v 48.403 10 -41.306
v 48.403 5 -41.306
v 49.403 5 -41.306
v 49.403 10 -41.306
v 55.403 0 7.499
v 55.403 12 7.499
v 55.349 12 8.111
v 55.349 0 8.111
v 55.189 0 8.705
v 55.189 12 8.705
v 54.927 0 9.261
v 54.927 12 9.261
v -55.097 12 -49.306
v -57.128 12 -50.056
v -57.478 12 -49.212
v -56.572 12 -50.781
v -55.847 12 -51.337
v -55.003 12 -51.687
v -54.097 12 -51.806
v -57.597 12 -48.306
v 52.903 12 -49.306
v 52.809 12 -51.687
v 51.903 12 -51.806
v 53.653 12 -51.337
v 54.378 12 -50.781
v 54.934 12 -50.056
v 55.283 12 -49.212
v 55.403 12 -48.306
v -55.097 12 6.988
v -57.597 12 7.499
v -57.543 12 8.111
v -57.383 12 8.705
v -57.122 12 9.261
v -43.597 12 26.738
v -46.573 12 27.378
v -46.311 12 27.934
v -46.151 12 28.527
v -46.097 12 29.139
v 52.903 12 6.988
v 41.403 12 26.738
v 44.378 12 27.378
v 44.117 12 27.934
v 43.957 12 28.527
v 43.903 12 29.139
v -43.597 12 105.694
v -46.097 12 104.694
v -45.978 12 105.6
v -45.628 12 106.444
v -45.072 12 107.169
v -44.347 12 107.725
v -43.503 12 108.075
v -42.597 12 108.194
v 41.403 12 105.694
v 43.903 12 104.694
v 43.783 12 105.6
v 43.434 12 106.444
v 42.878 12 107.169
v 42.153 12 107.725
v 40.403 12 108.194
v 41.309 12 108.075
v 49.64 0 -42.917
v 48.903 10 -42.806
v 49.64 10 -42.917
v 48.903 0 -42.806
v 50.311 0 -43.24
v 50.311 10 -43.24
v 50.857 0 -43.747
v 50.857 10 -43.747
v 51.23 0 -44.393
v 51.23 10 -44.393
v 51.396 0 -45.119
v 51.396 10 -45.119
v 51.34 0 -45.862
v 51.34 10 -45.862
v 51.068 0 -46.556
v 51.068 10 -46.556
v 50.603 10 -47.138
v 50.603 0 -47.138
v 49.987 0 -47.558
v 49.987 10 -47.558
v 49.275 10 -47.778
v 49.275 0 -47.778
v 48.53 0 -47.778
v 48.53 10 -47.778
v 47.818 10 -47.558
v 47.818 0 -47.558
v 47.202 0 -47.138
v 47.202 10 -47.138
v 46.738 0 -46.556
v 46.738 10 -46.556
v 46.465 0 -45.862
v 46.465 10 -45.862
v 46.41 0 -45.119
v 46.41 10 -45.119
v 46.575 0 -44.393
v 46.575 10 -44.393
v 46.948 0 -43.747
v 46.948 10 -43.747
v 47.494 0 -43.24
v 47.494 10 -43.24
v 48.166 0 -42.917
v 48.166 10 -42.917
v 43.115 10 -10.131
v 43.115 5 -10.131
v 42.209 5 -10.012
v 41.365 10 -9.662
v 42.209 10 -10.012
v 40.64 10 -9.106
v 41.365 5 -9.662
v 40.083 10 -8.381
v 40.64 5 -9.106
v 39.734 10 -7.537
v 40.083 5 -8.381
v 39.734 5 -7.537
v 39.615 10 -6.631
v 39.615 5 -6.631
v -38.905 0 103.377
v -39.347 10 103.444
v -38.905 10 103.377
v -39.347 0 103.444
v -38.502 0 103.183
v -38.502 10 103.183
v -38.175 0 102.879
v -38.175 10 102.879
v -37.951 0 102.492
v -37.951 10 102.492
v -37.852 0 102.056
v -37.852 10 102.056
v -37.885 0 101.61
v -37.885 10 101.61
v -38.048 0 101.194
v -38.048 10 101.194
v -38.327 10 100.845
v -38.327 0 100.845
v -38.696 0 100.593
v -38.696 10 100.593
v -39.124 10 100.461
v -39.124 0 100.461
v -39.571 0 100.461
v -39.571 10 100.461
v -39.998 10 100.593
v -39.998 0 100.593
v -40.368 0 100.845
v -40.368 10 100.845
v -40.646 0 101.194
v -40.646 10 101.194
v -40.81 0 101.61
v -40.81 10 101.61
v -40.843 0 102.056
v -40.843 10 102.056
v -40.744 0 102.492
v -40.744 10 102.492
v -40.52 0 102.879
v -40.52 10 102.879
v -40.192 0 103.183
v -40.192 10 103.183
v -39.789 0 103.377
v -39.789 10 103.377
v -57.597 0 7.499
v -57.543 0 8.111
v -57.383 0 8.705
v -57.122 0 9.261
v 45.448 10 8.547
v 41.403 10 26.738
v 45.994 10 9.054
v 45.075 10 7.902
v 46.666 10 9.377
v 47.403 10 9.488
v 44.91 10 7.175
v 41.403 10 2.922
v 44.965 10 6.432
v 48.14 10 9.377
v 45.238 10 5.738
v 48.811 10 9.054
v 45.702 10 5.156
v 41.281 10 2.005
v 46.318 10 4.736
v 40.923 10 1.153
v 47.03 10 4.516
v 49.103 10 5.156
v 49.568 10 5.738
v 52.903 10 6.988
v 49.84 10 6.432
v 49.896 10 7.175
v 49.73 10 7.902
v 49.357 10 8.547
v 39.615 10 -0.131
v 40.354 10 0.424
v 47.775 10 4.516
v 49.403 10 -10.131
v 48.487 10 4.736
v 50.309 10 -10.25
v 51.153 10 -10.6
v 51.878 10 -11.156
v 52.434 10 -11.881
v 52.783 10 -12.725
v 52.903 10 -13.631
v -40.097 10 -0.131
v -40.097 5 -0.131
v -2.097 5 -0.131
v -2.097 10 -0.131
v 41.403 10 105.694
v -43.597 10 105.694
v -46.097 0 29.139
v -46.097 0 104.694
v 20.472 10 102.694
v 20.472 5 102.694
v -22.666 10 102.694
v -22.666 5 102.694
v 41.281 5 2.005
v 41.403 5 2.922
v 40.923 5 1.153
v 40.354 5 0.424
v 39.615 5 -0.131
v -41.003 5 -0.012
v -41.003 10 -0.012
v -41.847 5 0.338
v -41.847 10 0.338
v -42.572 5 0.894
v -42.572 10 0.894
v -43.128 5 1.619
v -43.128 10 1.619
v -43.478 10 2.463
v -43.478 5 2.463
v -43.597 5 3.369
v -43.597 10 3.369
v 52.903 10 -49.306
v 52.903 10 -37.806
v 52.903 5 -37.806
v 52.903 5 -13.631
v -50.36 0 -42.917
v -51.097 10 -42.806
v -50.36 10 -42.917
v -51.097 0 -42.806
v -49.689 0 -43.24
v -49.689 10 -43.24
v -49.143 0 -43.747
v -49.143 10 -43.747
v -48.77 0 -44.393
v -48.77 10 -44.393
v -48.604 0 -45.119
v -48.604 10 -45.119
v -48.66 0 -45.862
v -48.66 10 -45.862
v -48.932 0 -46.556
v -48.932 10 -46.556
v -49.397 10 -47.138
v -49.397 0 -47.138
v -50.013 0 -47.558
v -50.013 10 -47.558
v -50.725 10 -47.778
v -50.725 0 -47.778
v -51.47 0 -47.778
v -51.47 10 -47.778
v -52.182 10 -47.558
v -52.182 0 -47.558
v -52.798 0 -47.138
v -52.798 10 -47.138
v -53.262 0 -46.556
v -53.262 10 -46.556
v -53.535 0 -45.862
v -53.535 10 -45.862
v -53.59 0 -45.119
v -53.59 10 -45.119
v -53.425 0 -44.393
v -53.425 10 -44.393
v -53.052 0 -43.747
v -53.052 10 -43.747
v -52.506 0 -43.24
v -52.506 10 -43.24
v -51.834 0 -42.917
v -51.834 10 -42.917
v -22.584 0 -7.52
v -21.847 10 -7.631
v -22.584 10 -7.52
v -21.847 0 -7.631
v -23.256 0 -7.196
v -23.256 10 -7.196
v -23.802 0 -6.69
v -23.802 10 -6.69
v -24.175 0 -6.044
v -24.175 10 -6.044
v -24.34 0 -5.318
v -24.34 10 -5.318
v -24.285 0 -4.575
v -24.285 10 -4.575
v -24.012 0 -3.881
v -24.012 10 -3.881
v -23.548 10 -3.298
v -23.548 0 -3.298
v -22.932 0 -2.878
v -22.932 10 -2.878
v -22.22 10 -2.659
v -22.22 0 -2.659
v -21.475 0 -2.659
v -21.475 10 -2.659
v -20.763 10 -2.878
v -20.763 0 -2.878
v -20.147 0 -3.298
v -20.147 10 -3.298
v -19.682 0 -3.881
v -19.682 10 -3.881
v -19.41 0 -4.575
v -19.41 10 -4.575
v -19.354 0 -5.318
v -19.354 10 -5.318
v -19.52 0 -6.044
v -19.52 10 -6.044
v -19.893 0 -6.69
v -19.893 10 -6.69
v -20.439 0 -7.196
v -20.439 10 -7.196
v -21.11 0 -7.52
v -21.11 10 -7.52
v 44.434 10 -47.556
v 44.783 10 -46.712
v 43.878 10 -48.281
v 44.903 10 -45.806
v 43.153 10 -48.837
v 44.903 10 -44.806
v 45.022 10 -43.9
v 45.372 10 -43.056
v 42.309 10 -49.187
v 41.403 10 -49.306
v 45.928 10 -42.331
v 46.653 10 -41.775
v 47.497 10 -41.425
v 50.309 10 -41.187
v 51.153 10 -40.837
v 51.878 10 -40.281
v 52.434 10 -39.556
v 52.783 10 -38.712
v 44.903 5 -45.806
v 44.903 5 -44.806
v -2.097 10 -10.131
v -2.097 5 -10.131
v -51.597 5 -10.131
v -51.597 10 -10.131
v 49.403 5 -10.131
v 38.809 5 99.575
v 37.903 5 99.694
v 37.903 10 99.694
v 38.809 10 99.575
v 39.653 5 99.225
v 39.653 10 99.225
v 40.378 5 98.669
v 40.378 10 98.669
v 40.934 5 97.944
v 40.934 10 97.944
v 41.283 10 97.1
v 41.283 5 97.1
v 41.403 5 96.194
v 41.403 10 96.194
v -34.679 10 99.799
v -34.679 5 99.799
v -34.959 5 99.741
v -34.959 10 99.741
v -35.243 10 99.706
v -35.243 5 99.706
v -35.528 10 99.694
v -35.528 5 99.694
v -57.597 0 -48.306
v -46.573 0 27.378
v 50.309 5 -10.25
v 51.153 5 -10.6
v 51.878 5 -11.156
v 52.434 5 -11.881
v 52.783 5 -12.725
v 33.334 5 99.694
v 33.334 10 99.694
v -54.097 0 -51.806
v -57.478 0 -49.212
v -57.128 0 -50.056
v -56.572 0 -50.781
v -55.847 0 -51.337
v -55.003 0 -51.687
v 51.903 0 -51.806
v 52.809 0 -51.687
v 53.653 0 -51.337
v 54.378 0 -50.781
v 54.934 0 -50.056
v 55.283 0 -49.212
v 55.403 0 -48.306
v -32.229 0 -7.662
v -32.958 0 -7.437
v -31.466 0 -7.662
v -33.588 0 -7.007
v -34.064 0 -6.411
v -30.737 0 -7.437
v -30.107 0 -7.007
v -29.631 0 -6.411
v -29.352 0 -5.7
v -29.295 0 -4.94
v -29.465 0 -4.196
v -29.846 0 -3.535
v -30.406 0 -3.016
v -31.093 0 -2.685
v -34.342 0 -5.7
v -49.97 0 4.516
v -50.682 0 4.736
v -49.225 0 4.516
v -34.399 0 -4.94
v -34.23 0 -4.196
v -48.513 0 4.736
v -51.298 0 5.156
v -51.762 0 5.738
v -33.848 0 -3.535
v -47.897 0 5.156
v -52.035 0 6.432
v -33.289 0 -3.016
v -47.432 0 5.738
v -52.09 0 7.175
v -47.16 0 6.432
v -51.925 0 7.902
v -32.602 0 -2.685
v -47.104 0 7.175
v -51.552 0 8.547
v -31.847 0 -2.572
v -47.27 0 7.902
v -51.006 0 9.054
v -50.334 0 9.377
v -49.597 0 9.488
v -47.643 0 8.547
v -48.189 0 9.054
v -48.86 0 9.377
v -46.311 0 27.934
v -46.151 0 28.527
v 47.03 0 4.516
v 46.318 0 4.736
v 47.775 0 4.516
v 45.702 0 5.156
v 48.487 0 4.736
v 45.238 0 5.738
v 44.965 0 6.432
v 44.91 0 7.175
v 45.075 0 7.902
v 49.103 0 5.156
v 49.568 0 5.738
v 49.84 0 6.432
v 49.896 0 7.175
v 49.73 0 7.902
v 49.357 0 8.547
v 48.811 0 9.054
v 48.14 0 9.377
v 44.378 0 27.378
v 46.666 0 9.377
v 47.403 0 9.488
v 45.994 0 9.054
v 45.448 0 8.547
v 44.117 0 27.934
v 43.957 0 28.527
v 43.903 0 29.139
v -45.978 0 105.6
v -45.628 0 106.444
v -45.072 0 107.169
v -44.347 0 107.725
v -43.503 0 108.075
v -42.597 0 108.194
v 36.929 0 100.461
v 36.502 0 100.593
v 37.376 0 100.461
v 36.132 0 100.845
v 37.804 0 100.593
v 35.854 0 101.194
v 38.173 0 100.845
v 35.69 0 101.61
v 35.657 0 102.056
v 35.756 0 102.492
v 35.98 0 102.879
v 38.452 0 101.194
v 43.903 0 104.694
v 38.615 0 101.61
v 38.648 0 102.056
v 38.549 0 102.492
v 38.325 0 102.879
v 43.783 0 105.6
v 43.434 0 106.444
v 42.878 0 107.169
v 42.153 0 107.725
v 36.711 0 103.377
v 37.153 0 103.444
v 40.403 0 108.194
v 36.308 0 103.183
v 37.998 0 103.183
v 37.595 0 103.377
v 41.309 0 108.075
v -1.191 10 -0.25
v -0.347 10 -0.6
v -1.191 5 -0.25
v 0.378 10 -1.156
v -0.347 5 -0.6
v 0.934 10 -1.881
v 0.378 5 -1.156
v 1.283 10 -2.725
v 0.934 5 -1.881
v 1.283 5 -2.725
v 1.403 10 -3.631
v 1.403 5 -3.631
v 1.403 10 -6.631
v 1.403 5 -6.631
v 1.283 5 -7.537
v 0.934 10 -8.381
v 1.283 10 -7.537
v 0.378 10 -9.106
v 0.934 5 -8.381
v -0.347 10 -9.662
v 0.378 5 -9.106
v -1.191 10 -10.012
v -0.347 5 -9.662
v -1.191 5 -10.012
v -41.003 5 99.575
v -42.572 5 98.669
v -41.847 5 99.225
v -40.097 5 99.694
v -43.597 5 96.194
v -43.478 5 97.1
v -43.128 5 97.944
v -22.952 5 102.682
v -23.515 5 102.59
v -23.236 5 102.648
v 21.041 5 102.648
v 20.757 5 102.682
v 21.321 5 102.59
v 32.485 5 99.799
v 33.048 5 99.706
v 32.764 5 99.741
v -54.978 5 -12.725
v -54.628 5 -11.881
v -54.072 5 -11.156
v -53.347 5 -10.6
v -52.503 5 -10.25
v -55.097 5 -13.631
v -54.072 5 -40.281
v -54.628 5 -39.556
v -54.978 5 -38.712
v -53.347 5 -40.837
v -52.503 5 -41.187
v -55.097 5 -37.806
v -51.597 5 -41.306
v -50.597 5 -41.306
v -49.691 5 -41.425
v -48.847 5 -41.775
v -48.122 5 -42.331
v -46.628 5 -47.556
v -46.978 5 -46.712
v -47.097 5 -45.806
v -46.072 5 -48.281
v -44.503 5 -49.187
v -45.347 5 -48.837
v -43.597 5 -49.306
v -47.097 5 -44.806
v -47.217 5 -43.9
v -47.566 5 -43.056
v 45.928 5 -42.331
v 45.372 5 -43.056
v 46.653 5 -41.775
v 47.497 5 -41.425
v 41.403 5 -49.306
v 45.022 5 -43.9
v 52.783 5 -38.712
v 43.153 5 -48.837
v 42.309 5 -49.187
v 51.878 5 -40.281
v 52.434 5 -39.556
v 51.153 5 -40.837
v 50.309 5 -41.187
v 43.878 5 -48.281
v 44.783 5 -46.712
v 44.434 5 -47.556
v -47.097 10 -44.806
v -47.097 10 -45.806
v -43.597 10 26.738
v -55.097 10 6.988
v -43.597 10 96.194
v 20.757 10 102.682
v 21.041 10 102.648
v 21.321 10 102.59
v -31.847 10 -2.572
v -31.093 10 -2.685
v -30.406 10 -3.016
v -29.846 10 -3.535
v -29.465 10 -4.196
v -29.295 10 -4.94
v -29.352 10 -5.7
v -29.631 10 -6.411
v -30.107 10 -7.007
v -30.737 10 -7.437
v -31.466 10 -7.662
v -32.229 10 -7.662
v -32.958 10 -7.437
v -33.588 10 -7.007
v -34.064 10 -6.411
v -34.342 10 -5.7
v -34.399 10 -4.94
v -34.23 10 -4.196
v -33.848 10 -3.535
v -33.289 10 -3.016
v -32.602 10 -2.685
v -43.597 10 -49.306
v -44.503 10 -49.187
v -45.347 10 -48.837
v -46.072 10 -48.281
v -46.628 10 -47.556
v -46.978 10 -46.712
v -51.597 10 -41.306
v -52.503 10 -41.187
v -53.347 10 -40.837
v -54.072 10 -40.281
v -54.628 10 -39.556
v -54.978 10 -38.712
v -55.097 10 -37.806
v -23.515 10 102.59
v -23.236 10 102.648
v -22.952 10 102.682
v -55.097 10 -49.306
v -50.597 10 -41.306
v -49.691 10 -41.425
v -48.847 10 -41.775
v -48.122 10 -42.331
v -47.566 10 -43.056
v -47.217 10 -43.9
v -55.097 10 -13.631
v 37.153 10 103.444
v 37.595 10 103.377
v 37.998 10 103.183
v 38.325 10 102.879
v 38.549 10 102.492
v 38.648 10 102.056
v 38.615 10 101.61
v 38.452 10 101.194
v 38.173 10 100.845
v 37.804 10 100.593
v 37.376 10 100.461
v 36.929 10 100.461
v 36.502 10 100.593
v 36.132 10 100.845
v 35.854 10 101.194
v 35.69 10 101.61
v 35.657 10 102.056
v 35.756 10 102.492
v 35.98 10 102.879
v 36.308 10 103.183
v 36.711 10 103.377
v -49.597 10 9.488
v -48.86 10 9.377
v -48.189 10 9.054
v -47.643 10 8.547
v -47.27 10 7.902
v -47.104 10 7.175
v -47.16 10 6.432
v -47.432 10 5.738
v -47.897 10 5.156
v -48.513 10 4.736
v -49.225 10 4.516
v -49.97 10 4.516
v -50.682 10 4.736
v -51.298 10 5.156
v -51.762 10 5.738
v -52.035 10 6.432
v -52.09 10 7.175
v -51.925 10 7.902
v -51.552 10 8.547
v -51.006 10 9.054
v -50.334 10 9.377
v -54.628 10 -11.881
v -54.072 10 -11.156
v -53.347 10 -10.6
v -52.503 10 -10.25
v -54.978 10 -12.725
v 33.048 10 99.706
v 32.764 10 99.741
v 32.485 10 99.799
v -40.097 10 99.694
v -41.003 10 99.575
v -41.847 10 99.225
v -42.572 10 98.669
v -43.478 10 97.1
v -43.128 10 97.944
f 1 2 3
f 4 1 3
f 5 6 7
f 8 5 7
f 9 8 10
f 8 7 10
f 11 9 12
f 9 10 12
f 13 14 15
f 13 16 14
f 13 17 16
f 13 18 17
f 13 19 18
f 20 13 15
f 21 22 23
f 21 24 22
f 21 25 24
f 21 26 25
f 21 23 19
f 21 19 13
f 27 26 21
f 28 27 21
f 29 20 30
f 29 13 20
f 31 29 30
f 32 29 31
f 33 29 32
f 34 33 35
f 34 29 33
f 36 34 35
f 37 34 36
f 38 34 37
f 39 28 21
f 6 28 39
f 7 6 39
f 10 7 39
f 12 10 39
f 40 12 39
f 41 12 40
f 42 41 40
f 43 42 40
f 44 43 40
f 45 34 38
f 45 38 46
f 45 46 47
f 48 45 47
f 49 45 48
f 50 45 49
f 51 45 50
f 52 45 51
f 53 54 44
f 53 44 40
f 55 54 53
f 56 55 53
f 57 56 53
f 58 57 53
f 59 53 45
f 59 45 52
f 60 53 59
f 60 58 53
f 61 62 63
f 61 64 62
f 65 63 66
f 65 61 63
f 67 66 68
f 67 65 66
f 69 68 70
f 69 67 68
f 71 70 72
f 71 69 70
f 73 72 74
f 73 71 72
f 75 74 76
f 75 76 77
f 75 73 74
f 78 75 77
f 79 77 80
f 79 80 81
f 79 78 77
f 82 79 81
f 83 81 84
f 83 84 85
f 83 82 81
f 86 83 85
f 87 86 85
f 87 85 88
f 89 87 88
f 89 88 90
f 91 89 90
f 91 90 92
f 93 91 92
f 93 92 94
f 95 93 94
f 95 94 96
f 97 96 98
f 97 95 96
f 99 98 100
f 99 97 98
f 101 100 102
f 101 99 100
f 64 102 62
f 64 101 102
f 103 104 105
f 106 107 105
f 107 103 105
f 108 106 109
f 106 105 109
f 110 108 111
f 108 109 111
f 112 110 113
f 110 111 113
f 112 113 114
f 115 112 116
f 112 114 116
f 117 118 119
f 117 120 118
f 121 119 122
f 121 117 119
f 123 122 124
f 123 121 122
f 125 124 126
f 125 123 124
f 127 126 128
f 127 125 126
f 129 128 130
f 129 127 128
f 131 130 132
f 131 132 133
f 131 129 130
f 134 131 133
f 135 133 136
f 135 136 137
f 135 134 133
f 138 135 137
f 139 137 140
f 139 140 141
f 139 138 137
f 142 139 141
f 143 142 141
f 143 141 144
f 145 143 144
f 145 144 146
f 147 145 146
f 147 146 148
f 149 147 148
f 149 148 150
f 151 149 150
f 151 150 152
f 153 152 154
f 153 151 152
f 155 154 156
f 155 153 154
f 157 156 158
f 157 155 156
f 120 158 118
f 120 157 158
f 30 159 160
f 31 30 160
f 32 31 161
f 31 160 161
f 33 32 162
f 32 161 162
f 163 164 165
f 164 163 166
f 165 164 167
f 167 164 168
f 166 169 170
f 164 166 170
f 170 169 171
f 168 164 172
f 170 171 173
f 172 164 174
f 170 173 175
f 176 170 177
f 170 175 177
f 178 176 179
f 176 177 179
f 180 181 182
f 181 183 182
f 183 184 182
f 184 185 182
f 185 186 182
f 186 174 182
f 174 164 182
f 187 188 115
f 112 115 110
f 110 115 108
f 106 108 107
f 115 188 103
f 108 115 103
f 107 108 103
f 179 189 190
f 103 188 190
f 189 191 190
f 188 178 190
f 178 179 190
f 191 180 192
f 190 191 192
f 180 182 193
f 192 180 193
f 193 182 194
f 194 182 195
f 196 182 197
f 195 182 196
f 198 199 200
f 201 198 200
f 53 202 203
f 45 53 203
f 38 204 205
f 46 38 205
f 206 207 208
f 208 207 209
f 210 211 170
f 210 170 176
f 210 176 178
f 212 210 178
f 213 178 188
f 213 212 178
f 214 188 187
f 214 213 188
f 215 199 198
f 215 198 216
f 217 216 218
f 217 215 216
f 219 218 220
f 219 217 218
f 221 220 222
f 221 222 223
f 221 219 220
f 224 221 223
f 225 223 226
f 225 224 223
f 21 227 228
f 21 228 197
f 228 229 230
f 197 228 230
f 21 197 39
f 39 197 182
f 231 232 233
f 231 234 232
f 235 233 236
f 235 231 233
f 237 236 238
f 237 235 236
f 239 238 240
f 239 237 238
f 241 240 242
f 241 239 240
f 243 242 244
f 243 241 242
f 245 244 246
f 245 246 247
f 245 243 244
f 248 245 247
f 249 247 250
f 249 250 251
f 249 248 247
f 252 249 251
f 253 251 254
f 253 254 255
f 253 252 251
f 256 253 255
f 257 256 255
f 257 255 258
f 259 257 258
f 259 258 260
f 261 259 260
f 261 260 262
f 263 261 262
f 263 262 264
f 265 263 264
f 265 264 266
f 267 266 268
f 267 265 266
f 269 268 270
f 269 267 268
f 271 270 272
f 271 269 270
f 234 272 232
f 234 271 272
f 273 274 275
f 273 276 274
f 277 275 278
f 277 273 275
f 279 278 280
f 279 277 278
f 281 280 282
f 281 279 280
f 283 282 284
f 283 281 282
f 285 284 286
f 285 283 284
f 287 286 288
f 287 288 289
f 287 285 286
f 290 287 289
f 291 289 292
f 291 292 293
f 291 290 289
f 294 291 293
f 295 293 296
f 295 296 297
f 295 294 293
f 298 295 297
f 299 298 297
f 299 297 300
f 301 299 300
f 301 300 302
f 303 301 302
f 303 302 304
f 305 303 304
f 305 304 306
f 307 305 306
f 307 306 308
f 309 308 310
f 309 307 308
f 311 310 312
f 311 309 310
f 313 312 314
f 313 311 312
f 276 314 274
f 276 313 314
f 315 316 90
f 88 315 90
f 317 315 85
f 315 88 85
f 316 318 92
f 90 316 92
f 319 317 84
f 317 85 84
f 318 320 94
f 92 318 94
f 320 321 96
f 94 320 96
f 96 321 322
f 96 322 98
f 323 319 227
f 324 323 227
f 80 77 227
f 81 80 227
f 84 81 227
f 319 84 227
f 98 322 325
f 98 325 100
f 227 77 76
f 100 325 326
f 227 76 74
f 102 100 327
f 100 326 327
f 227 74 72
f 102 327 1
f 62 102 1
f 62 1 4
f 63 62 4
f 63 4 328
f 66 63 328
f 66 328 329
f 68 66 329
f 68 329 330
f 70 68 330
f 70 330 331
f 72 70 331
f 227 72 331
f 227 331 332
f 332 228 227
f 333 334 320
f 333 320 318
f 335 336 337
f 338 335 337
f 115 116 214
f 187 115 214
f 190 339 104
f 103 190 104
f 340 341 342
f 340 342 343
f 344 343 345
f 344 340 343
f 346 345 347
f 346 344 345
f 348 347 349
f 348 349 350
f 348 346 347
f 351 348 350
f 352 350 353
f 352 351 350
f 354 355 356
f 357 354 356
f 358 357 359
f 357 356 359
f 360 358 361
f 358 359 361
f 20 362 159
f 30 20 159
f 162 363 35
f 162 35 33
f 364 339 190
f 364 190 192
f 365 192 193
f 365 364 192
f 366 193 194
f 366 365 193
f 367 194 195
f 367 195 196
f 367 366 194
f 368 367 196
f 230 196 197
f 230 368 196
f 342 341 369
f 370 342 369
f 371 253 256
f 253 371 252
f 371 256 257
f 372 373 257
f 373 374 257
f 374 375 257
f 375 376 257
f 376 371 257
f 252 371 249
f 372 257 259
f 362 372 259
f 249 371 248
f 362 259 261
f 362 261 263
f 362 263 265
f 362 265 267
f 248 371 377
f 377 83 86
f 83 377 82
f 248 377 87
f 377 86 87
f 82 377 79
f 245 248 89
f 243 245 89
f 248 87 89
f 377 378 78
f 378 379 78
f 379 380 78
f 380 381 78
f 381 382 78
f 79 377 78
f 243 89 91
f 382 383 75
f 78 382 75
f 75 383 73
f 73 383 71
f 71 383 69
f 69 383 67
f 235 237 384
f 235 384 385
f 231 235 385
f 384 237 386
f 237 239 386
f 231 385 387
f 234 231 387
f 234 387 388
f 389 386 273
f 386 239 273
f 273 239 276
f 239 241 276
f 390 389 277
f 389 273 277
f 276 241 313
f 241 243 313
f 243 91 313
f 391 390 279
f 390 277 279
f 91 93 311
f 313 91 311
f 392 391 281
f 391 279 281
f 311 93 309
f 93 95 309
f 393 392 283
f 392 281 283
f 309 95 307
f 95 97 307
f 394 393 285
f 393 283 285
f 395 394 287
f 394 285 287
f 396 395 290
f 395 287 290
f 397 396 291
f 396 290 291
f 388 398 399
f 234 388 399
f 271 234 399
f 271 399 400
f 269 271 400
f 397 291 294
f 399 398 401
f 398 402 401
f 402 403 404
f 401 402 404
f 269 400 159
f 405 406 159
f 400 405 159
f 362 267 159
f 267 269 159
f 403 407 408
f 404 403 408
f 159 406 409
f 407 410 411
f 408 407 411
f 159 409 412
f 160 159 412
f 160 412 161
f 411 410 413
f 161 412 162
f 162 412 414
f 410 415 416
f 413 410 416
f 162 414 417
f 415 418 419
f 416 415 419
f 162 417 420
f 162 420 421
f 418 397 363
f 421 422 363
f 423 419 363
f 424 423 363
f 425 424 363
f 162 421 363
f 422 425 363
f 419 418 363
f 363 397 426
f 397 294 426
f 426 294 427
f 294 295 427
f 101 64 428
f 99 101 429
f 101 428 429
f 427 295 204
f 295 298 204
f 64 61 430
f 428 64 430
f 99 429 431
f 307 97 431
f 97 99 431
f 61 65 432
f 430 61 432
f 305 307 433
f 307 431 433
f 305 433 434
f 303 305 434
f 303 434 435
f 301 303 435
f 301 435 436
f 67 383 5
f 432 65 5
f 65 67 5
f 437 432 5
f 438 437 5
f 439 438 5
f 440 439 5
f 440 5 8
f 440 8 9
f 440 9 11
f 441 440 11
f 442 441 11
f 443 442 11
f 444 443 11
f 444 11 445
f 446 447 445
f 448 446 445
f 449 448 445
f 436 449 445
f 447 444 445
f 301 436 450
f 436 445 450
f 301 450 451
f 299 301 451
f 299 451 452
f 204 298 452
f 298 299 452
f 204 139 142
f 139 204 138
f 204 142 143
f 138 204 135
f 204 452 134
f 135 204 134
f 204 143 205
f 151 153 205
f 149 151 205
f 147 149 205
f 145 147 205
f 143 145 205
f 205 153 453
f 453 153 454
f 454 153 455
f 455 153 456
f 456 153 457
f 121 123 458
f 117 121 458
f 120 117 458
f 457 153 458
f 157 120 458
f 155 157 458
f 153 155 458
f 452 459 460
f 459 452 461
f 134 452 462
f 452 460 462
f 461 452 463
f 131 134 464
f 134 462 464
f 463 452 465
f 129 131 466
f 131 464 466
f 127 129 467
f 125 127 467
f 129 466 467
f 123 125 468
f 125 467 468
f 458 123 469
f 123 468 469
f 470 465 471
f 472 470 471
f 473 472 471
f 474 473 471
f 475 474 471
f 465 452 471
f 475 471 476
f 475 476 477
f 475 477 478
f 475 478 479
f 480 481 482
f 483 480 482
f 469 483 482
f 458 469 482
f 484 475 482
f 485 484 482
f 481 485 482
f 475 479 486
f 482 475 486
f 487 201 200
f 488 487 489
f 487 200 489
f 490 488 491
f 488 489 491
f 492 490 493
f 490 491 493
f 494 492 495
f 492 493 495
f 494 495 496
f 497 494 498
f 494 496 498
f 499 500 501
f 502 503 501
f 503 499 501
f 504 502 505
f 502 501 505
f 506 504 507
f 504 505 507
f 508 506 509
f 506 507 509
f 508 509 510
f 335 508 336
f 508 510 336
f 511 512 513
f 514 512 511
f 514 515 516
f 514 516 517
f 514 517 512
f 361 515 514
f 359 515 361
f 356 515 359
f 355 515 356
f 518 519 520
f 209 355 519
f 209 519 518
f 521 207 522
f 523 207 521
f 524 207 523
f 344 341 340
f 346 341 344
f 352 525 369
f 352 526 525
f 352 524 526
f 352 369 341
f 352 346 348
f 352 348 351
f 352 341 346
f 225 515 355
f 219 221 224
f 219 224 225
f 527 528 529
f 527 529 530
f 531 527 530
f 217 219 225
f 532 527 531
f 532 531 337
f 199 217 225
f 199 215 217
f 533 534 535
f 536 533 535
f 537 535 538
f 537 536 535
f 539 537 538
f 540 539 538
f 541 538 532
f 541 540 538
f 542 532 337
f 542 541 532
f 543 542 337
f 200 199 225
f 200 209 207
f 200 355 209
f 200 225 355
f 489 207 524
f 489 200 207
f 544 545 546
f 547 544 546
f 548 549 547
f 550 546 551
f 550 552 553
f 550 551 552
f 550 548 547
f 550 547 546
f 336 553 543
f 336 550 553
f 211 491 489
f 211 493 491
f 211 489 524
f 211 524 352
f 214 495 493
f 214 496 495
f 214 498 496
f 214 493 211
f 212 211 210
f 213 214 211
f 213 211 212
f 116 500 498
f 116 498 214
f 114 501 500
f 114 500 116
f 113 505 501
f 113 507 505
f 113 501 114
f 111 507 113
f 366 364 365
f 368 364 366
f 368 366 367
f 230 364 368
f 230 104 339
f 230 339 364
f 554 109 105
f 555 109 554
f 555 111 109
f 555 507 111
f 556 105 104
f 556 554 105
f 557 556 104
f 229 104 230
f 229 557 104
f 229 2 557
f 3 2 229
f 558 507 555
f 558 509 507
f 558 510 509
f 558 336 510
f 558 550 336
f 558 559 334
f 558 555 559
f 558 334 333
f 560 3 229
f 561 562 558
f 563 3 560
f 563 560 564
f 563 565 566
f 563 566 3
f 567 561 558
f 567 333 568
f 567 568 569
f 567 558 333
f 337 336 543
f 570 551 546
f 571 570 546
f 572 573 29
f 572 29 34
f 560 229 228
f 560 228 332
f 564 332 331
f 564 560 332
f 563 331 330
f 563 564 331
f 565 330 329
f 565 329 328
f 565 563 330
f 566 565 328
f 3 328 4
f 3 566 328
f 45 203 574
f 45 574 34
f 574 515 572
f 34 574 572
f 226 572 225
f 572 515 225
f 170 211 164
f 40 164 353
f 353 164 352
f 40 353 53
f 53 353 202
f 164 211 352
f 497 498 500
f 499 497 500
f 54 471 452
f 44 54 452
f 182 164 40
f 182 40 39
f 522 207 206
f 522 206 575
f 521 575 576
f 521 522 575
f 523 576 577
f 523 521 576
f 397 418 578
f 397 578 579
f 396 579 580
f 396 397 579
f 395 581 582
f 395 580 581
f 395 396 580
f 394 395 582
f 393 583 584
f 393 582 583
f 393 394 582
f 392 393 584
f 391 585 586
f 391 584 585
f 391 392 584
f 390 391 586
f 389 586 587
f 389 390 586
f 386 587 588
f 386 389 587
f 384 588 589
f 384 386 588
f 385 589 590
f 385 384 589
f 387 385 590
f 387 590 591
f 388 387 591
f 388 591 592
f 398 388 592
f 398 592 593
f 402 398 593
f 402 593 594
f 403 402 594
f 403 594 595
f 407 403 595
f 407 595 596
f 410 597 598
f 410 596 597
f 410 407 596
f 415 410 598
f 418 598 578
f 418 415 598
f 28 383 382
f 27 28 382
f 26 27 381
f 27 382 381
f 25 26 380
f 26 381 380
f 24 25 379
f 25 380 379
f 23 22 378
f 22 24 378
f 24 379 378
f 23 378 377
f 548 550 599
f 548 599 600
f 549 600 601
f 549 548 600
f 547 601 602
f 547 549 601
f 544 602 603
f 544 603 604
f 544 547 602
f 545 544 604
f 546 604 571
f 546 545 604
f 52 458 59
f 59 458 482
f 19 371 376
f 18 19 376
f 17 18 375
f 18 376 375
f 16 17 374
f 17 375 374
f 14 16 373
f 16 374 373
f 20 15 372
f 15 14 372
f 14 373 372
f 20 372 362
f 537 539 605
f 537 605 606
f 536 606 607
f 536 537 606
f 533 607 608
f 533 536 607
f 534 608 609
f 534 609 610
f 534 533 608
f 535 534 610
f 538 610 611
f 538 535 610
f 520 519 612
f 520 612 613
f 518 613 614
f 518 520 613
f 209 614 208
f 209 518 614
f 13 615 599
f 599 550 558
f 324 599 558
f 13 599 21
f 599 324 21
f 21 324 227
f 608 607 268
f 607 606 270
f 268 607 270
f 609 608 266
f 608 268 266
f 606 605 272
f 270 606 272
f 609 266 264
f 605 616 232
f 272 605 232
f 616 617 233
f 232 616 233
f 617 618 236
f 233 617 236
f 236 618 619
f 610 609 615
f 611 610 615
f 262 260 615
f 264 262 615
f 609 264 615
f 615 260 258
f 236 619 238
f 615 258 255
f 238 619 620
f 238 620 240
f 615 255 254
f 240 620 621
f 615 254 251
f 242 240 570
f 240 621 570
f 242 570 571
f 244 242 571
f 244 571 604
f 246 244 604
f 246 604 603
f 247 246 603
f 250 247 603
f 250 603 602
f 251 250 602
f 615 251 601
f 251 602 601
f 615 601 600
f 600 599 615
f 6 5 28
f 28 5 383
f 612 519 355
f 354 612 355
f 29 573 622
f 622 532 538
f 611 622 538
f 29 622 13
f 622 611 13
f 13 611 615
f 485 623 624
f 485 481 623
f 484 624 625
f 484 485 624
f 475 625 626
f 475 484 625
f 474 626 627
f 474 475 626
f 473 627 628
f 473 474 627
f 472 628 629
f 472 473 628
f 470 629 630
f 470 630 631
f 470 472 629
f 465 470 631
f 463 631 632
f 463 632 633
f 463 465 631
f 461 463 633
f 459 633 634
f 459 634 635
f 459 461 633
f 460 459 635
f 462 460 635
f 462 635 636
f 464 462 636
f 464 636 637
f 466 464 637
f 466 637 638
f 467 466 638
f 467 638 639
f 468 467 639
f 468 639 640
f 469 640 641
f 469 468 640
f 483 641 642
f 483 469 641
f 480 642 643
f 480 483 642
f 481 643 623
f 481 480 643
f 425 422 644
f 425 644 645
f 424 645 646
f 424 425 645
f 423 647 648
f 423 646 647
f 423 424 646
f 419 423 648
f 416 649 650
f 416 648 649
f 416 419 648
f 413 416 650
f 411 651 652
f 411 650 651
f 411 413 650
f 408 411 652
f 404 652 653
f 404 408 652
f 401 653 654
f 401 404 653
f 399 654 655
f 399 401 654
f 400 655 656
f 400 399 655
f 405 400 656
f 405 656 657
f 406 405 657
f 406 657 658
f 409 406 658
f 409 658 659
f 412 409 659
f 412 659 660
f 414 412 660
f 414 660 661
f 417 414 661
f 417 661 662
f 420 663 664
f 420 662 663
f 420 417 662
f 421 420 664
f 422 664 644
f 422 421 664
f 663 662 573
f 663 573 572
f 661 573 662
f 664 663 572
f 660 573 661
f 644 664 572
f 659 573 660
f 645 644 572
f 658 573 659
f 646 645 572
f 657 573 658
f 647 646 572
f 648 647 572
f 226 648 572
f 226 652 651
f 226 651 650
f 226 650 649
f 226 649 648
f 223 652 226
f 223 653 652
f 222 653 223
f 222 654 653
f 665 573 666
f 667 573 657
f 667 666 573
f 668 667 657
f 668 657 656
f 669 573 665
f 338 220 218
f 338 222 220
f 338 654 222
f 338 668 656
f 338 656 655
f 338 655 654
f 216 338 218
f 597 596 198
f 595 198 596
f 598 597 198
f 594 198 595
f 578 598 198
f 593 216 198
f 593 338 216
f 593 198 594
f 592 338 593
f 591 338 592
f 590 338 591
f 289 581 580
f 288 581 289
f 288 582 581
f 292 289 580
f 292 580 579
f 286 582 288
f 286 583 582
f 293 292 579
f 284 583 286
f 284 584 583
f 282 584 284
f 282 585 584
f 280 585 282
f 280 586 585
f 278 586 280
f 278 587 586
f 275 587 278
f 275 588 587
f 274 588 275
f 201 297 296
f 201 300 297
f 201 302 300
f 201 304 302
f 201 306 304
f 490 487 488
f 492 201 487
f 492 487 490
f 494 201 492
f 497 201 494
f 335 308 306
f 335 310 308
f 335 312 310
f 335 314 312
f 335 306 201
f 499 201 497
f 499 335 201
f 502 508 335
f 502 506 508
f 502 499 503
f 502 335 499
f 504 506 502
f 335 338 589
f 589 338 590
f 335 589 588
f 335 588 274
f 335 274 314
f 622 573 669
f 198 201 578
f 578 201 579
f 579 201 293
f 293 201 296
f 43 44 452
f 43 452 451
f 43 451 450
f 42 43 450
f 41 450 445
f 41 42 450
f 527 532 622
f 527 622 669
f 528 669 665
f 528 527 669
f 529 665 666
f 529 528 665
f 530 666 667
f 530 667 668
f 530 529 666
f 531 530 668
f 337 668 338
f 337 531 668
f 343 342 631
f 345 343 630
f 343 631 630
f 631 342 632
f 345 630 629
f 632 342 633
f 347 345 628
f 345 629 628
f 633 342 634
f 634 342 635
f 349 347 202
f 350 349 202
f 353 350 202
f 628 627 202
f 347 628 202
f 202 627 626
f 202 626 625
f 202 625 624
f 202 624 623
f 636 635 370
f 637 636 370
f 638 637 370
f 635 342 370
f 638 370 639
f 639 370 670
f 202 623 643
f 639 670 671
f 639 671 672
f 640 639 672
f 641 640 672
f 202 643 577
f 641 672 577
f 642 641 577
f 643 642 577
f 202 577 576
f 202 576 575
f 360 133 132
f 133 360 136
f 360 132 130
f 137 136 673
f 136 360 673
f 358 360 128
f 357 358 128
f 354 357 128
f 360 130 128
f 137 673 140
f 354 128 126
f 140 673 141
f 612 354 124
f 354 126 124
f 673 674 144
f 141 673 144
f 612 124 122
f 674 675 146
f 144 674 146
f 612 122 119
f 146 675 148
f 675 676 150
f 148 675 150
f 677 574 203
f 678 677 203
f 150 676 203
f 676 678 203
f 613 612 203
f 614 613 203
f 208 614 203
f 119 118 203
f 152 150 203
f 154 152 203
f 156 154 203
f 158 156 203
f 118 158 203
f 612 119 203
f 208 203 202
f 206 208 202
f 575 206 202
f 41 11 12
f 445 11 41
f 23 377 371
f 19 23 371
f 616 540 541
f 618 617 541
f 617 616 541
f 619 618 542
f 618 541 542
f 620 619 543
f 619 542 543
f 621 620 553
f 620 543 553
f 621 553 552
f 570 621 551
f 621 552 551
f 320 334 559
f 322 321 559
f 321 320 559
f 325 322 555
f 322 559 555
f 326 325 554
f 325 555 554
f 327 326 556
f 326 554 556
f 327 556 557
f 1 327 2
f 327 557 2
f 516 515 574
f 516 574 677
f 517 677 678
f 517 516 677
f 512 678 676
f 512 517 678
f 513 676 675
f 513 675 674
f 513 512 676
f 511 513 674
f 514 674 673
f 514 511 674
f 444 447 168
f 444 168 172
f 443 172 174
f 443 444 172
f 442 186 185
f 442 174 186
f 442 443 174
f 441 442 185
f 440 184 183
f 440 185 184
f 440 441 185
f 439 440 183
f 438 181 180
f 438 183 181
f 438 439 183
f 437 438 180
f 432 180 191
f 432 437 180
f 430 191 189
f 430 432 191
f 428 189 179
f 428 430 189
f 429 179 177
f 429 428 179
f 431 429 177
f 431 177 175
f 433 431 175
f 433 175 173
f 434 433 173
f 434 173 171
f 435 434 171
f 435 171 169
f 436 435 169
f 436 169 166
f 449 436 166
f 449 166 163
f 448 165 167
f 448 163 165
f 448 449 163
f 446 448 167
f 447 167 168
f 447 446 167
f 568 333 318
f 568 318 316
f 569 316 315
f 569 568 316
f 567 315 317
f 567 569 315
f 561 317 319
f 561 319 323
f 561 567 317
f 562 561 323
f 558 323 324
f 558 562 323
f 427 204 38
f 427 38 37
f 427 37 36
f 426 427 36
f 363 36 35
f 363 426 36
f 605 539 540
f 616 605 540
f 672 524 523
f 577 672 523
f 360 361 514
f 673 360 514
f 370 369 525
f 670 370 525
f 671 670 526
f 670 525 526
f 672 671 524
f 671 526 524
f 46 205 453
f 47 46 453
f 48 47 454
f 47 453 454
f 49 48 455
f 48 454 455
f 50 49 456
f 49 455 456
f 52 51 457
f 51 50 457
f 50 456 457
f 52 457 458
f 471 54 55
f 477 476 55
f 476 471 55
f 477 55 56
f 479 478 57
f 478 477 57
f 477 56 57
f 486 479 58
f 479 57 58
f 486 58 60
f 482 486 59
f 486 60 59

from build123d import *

# Parameters (mm, degrees)
BOSS_EXTRUDE1_DEPTH     = 5
BOSS_EXTRUDE2_DEPTH     = 7
SKETCH3_R               = 1.5
SKETCH3_W               = 8
SKETCH3_H               = 8
SKETCH3_R_2             = 2.5
BOSS_EXTRUDE3_DEPTH     = 5
SKETCH4_R               = 2.5
BOSS_EXTRUDE4_DEPTH     = 5
CUT_EXTRUDE1_DEPTH      = 123.769787834
CUT_EXTRUDE1_DEPTH_BACK = 123.769787834
SKETCH5_R               = 2.5
SKETCH5_R_2             = 2.55926668
SKETCH5_R_3             = 1.5
FILLET1_R               = 3.5


with BuildPart() as part:
    # Sketch1 → Boss-Extrude1 (new body)
    with BuildSketch(Plane(origin=(0, 0, 0), x_dir=(1, 0, 0), z_dir=(0, 1, 0))):
        Polygon((-57.597316241, 51.805869074), (-57.597316241, -8.444130926), (-46.097316241, -28.194130926), (-46.097316241, -108.194130926), (43.902683759, -108.194130926), (43.902683759, -28.194130926), (55.402683759, -8.444130926), (55.402683759, 51.805869074), align=None)
    extrude(amount=BOSS_EXTRUDE1_DEPTH)

    # Sketch2 → Boss-Extrude2 (add)
    with BuildSketch(Plane(origin=(0, 5, 0), x_dir=(1, 0, 0), z_dir=(0, 1, 0))):
        Polygon((-46.097316241, -28.194130926), (-46.097316241, -108.194130926), (43.902683759, -108.194130926), (43.902683759, -28.194130926), (41.402683759, -28.194130926), (41.402683759, -105.694130926), (-43.597316241, -105.694130926), (-43.597316241, -28.194130926), align=None)
        Polygon((52.902683759, -6.988434723), (55.402683759, -8.444130926), (43.902683759, -28.194130926), (41.402683759, -26.738434723), align=None)
        Polygon((41.402683759, -28.194130926), (43.902683759, -28.194130926), (41.402683759, -26.738434723), align=None)
        Polygon((52.902683759, -6.988434723), (55.402683759, -8.444130926), (55.402683759, -6.988434723), align=None)
        Polygon((-57.597316241, 51.805869074), (-57.597316241, -6.988434723), (-55.097316241, -6.988434723), (-55.097316241, 49.305869074), (52.902683759, 49.305869074), (52.902683759, -6.988434723), (55.402683759, -6.988434723), (55.402683759, 51.805869074), align=None)
        Polygon((-43.597316241, -26.738434723), (-46.097316241, -28.194130926), (-43.597316241, -28.194130926), align=None)
        Polygon((-43.597316241, -26.738434723), (-46.097316241, -28.194130926), (-57.597316241, -8.444130926), (-55.097316241, -6.988434723), align=None)
        Polygon((-57.597316241, -6.988434723), (-57.597316241, -8.444130926), (-55.097316241, -6.988434723), align=None)
    extrude(amount=BOSS_EXTRUDE2_DEPTH)

    # Sketch3 → Boss-Extrude3 (add)
    # profile 1 of 3: a face of its own
    with BuildSketch(Plane(origin=(0, 5, 0), x_dir=(1, 0, 0), z_dir=(0, 1, 0))):
        Polygon((-43.597316241, -99.694130926), (-43.597316241, -105.694130926), (41.402683759, -105.694130926), (41.402683759, -99.694130926), (32.902683759, -99.694130926), (20.902683759, -102.694130926), (-23.097316241, -102.694130926), (-35.097316241, -99.694130926), align=None)
        with Locations(Location((-39.347316241, -101.944130926, 0), (0, 0, 270))):
            Circle(SKETCH3_R, mode=Mode.SUBTRACT)
        with Locations(Location((37.152683759, -101.944130926, 0), (0, 0, 270))):
            Circle(SKETCH3_R, mode=Mode.SUBTRACT)
    # profile 2 of 3: a face of its own
    with BuildSketch(Plane(origin=(0, 5, 0), x_dir=(1, 0, 0), z_dir=(0, 1, 0))):
        with Locations((-51.097316241, 45.305869074)):
            Rectangle(SKETCH3_W, SKETCH3_H)
        with Locations(Location((-51.097316241, 45.305869074, 0), (0, 0, 270))):
            Circle(SKETCH3_R_2, mode=Mode.SUBTRACT)
    # profile 3 of 3: a face of its own
    with BuildSketch(Plane(origin=(0, 5, 0), x_dir=(1, 0, 0), z_dir=(0, 1, 0))):
        with Locations((48.902683759, 45.305869074)):
            Rectangle(SKETCH3_W, SKETCH3_H)
        with Locations(Location((48.902683759, 45.305869074, 0), (0, 0, 270))):
            Circle(SKETCH3_R_2, mode=Mode.SUBTRACT)
    extrude(amount=BOSS_EXTRUDE3_DEPTH)

    # Sketch4 → Boss-Extrude4 (add)
    # profile 1 of 2: a face of its own
    with BuildSketch(Plane(origin=(0, 5, 0), x_dir=(1, 0, 0), z_dir=(0, 1, 0))):
        Polygon((1.402683759, 10.130869074), (-55.097316241, 10.130869074), (-55.097316241, -6.988434723), (-43.597316241, -26.738434723), (-43.597316241, 0.130869074), (1.402683759, 0.130869074), align=None)
        with Locations(Location((-31.847316241, 5.130869074, 0), (0, 0, 90))):
            Circle(SKETCH4_R, mode=Mode.SUBTRACT)
        with Locations(Location((-21.847316241, 5.130869074, 0), (0, 0, 90))):
            Circle(SKETCH4_R, mode=Mode.SUBTRACT)
    # profile 2 of 2: a face of its own
    with BuildSketch(Plane(origin=(0, 5, 0), x_dir=(1, 0, 0), z_dir=(0, 1, 0))):
        Polygon((39.6145491, 10.130869074), (39.6145491, 0.130869074), (41.402683759, 0.130869074), (41.402683759, -26.738434723), (52.902683759, -6.988434723), (52.902683759, 10.130869074), align=None)
    extrude(amount=BOSS_EXTRUDE4_DEPTH)

    # Sketch5 → Cut-Extrude1 (cut, two sides: drawn at the far end of the back side and taken through both)
    with BuildSketch(Plane(origin=(0, 5, 0), x_dir=(1, 0, 0), z_dir=(0, 1, 0)).offset(-CUT_EXTRUDE1_DEPTH_BACK)):
        with Locations(Location((-21.847316241, 5.130869074, 0), (0, 0, 90))):
            Circle(SKETCH5_R)
        with Locations(Location((-31.847316241, 5.130869074, 0), (0, 0, 270))):
            Circle(SKETCH5_R_2)
        with Locations(Location((-39.347316241, -101.944130926, 0), (0, 0, 270))):
            Circle(SKETCH5_R_3)
        with Locations(Location((37.152683759, -101.944130926, 0), (0, 0, 270))):
            Circle(SKETCH5_R_3)
        with Locations(Location((-51.097316241, 45.305869074, 0), (0, 0, 270))):
            Circle(SKETCH5_R)
        with Locations(Location((48.902683759, 45.305869074, 0), (0, 0, 270))):
            Circle(SKETCH5_R)
        with Locations(Location((-49.597316241, -6.988434723, 0), (0, 0, 270))):
            Circle(SKETCH5_R)
        with Locations(Location((47.402683759, -6.988434723, 0), (0, 0, 270))):
            Circle(SKETCH5_R)
    extrude(amount=CUT_EXTRUDE1_DEPTH + CUT_EXTRUDE1_DEPTH_BACK, mode=Mode.SUBTRACT)

    # Fillet1
    # the kernel refuses this fillet: 3.5 mm, written as the material it adds along each edge
    with BuildSketch(Plane(origin=(41.402683759, 5, 99.694130926), x_dir=(0, 0, -1), z_dir=(0, 1, 0)), Plane(origin=(-55.097316241, 5, -41.305869074), x_dir=(0, 0, 1), z_dir=(0, 1, 0)), Plane(origin=(44.902683759, 5, -49.305869074), x_dir=(-1, 0, 0), z_dir=(0, 1, 0)), Plane(origin=(52.902683759, 5, -10.130869074), x_dir=(0, 0, -1), z_dir=(0, 1, 0)), Plane(origin=(-43.597316241, 5, -0.130869074), x_dir=(0, 0, 1), z_dir=(0, 1, 0))) as fillet1_piece_1:
        with BuildLine():
            CenterArc((FILLET1_R, FILLET1_R), FILLET1_R, 180, 90)
            Line((0, FILLET1_R), (0, 0))
            Line((0, 0), (FILLET1_R, 0))
        make_face()
    extrude(amount=5)
    with BuildSketch(Plane(origin=(20.902683759, 3.922825776, 102.694130926), x_dir=(-1, 0, 0), z_dir=(0, 1, 0)), Plane(origin=(-23.097316241, 3.922825776, 102.694130926), x_dir=(-0.9701425001453338, 0, -0.2425356250363252), z_dir=(0, 1, 0))) as fillet1_piece_2:
        with BuildLine():
            CenterArc((FILLET1_R * 0.123105625618, -FILLET1_R), FILLET1_R, 90, 14.036243468)
            Line((-FILLET1_R * 0.119429999419, -FILLET1_R * 0.0298574998547), (0, 0))
            Line((0, 0), (FILLET1_R * 0.123105625618, 0))
        make_face()
    extrude(amount=6.077174224)
    with BuildSketch(Plane(origin=(-43.597316241, 5, 99.694130926), x_dir=(0, 0, -1), z_dir=(0, 1, 0)), Plane(origin=(-47.097316241, 5, -49.305869074), x_dir=(1, 0, 0), z_dir=(0, 1, 0)), Plane(origin=(52.902683759, 5, -41.305869074), x_dir=(0, 0, 1), z_dir=(0, 1, 0)), Plane(origin=(-55.097316241, 5, -10.130869074), x_dir=(0, 0, -1), z_dir=(0, 1, 0))) as fillet1_piece_3:
        with BuildLine():
            CenterArc((FILLET1_R, -FILLET1_R), FILLET1_R, 90, 90)
            Line((0, -FILLET1_R), (0, 0))
            Line((0, 0), (FILLET1_R, 0))
        make_face()
    extrude(amount=5)
    with BuildSketch(Plane(origin=(43.902683759, 12, 28.194130926), x_dir=(0.5031907286678252, 0, -0.864175381842565), z_dir=(0, -1, 0)), Plane(origin=(-46.097316241, 0, 28.194130926), x_dir=(-0.5031907286678269, 0, -0.8641753818425641), z_dir=(0, 1, 0))) as fillet1_piece_4:
        with BuildLine():
            CenterArc((FILLET1_R * 0.269926710528, FILLET1_R), FILLET1_R, 239.788677614, 30.211322386)
            Line((-FILLET1_R * 0.23326401814, FILLET1_R * 0.135824618157), (0, 0))
            Line((0, 0), (FILLET1_R * 0.269926710528, 0))
        make_face()
    extrude(amount=12)
    with BuildSketch(Plane(origin=(41.402683759, 5, -0.130869074), x_dir=(0, 0, 1), z_dir=(0, 1, 0))) as fillet1_piece_5:
        with BuildLine():
            CenterArc((3.052788407, -3.5), FILLET1_R, 90, 60.718267745)
            Line((0, -1.788134659), (0, 0))
            Line((0, 0), (3.052788407, 0))
        make_face()
    extrude(amount=5)
    # the kernel refuses this fillet: 3.5 mm, written as the material it takes off along each edge
    with BuildSketch(Plane(origin=(32.902683759, 5, 99.694130926), x_dir=(1, 0, 0), z_dir=(0, 1, 0)), Plane(origin=(-35.097316241, 5, 99.694130926), x_dir=(0.9701425001453338, 0, 0.2425356250363252), z_dir=(0, 1, 0))) as fillet1_2_piece_1:
        with BuildLine():
            CenterArc((FILLET1_R * 0.123105625618, -FILLET1_R), FILLET1_R, 90, 14.036243468)
            Line((-FILLET1_R * 0.119429999419, -FILLET1_R * 0.0298574998547), (0, 0))
            Line((0, 0), (FILLET1_R * 0.123105625618, 0))
        make_face()
    extrude(amount=6.077174224, mode=Mode.SUBTRACT)
    with BuildSketch(Plane(origin=(-47.097316241, 5, -41.305869074), x_dir=(-1, 0, 0), z_dir=(0, 1, 0)), Plane(origin=(44.902683759, 5, -41.305869074), x_dir=(0, 0, -1), z_dir=(0, 1, 0)), Plane(origin=(39.6145491, 5, -10.130869074), x_dir=(1, 0, 0), z_dir=(0, 1, 0)), Plane(origin=(1.402683759, 5, -10.130869074), x_dir=(0, 0, 1), z_dir=(0, 1, 0))) as fillet1_2_piece_2:
        with BuildLine():
            CenterArc((FILLET1_R, -FILLET1_R), FILLET1_R, 90, 90)
            Line((0, -FILLET1_R), (0, 0))
            Line((0, 0), (FILLET1_R, 0))
        make_face()
    extrude(amount=13.75, mode=Mode.SUBTRACT)
    with BuildSketch(Plane(origin=(55.402683759, 14.361858717, 8.444130926), x_dir=(0, 0, -1), z_dir=(0, -1, 0)), Plane(origin=(-57.597316241, -2.361858717, 8.444130926), x_dir=(0, 0, -1), z_dir=(0, 1, 0))) as fillet1_2_piece_3:
        with BuildLine():
            CenterArc((FILLET1_R * 0.269926710528, -FILLET1_R), FILLET1_R, 90, 30.211322386)
            Line((-FILLET1_R * 0.23326401814, -FILLET1_R * 0.135824618157), (0, 0))
            Line((0, 0), (FILLET1_R * 0.269926710528, 0))
        make_face()
    extrude(amount=16.723717434, mode=Mode.SUBTRACT)
    with BuildSketch(Plane(origin=(43.902683759, 20.75, 108.194130926), x_dir=(-1, 0, 0), z_dir=(0, -1, 0))) as fillet1_2_piece_4:
        with BuildLine():
            CenterArc((FILLET1_R, FILLET1_R), FILLET1_R, 180, 90)
            Line((0, FILLET1_R), (0, 0))
            Line((0, 0), (FILLET1_R, 0))
        make_face()
    extrude(amount=29.5, mode=Mode.SUBTRACT)
    with BuildSketch(Plane(origin=(-46.097316241, -8.75, 108.194130926), x_dir=(0, 0, -1), z_dir=(0, 1, 0)), Plane(origin=(-57.597316241, -8.75, -51.805869074), x_dir=(1, 0, 0), z_dir=(0, 1, 0)), Plane(origin=(55.402683759, -8.75, -51.805869074), x_dir=(0, 0, 1), z_dir=(0, 1, 0))) as fillet1_2_piece_5:
        with BuildLine():
            CenterArc((FILLET1_R, -FILLET1_R), FILLET1_R, 90, 90)
            Line((0, -FILLET1_R), (0, 0))
            Line((0, 0), (FILLET1_R, 0))
        make_face()
    extrude(amount=29.5, mode=Mode.SUBTRACT)
    with BuildSketch(Plane(origin=(1.402683759, 5, -0.130869074), x_dir=(0, 0, -1), z_dir=(0, 1, 0))) as fillet1_2_piece_6:
        with BuildLine():
            CenterArc((FILLET1_R, FILLET1_R), FILLET1_R, 180, 90)
            Line((0, FILLET1_R), (0, 0))
            Line((0, 0), (FILLET1_R, 0))
        make_face()
    extrude(amount=13.75, mode=Mode.SUBTRACT)


solid = part.part
